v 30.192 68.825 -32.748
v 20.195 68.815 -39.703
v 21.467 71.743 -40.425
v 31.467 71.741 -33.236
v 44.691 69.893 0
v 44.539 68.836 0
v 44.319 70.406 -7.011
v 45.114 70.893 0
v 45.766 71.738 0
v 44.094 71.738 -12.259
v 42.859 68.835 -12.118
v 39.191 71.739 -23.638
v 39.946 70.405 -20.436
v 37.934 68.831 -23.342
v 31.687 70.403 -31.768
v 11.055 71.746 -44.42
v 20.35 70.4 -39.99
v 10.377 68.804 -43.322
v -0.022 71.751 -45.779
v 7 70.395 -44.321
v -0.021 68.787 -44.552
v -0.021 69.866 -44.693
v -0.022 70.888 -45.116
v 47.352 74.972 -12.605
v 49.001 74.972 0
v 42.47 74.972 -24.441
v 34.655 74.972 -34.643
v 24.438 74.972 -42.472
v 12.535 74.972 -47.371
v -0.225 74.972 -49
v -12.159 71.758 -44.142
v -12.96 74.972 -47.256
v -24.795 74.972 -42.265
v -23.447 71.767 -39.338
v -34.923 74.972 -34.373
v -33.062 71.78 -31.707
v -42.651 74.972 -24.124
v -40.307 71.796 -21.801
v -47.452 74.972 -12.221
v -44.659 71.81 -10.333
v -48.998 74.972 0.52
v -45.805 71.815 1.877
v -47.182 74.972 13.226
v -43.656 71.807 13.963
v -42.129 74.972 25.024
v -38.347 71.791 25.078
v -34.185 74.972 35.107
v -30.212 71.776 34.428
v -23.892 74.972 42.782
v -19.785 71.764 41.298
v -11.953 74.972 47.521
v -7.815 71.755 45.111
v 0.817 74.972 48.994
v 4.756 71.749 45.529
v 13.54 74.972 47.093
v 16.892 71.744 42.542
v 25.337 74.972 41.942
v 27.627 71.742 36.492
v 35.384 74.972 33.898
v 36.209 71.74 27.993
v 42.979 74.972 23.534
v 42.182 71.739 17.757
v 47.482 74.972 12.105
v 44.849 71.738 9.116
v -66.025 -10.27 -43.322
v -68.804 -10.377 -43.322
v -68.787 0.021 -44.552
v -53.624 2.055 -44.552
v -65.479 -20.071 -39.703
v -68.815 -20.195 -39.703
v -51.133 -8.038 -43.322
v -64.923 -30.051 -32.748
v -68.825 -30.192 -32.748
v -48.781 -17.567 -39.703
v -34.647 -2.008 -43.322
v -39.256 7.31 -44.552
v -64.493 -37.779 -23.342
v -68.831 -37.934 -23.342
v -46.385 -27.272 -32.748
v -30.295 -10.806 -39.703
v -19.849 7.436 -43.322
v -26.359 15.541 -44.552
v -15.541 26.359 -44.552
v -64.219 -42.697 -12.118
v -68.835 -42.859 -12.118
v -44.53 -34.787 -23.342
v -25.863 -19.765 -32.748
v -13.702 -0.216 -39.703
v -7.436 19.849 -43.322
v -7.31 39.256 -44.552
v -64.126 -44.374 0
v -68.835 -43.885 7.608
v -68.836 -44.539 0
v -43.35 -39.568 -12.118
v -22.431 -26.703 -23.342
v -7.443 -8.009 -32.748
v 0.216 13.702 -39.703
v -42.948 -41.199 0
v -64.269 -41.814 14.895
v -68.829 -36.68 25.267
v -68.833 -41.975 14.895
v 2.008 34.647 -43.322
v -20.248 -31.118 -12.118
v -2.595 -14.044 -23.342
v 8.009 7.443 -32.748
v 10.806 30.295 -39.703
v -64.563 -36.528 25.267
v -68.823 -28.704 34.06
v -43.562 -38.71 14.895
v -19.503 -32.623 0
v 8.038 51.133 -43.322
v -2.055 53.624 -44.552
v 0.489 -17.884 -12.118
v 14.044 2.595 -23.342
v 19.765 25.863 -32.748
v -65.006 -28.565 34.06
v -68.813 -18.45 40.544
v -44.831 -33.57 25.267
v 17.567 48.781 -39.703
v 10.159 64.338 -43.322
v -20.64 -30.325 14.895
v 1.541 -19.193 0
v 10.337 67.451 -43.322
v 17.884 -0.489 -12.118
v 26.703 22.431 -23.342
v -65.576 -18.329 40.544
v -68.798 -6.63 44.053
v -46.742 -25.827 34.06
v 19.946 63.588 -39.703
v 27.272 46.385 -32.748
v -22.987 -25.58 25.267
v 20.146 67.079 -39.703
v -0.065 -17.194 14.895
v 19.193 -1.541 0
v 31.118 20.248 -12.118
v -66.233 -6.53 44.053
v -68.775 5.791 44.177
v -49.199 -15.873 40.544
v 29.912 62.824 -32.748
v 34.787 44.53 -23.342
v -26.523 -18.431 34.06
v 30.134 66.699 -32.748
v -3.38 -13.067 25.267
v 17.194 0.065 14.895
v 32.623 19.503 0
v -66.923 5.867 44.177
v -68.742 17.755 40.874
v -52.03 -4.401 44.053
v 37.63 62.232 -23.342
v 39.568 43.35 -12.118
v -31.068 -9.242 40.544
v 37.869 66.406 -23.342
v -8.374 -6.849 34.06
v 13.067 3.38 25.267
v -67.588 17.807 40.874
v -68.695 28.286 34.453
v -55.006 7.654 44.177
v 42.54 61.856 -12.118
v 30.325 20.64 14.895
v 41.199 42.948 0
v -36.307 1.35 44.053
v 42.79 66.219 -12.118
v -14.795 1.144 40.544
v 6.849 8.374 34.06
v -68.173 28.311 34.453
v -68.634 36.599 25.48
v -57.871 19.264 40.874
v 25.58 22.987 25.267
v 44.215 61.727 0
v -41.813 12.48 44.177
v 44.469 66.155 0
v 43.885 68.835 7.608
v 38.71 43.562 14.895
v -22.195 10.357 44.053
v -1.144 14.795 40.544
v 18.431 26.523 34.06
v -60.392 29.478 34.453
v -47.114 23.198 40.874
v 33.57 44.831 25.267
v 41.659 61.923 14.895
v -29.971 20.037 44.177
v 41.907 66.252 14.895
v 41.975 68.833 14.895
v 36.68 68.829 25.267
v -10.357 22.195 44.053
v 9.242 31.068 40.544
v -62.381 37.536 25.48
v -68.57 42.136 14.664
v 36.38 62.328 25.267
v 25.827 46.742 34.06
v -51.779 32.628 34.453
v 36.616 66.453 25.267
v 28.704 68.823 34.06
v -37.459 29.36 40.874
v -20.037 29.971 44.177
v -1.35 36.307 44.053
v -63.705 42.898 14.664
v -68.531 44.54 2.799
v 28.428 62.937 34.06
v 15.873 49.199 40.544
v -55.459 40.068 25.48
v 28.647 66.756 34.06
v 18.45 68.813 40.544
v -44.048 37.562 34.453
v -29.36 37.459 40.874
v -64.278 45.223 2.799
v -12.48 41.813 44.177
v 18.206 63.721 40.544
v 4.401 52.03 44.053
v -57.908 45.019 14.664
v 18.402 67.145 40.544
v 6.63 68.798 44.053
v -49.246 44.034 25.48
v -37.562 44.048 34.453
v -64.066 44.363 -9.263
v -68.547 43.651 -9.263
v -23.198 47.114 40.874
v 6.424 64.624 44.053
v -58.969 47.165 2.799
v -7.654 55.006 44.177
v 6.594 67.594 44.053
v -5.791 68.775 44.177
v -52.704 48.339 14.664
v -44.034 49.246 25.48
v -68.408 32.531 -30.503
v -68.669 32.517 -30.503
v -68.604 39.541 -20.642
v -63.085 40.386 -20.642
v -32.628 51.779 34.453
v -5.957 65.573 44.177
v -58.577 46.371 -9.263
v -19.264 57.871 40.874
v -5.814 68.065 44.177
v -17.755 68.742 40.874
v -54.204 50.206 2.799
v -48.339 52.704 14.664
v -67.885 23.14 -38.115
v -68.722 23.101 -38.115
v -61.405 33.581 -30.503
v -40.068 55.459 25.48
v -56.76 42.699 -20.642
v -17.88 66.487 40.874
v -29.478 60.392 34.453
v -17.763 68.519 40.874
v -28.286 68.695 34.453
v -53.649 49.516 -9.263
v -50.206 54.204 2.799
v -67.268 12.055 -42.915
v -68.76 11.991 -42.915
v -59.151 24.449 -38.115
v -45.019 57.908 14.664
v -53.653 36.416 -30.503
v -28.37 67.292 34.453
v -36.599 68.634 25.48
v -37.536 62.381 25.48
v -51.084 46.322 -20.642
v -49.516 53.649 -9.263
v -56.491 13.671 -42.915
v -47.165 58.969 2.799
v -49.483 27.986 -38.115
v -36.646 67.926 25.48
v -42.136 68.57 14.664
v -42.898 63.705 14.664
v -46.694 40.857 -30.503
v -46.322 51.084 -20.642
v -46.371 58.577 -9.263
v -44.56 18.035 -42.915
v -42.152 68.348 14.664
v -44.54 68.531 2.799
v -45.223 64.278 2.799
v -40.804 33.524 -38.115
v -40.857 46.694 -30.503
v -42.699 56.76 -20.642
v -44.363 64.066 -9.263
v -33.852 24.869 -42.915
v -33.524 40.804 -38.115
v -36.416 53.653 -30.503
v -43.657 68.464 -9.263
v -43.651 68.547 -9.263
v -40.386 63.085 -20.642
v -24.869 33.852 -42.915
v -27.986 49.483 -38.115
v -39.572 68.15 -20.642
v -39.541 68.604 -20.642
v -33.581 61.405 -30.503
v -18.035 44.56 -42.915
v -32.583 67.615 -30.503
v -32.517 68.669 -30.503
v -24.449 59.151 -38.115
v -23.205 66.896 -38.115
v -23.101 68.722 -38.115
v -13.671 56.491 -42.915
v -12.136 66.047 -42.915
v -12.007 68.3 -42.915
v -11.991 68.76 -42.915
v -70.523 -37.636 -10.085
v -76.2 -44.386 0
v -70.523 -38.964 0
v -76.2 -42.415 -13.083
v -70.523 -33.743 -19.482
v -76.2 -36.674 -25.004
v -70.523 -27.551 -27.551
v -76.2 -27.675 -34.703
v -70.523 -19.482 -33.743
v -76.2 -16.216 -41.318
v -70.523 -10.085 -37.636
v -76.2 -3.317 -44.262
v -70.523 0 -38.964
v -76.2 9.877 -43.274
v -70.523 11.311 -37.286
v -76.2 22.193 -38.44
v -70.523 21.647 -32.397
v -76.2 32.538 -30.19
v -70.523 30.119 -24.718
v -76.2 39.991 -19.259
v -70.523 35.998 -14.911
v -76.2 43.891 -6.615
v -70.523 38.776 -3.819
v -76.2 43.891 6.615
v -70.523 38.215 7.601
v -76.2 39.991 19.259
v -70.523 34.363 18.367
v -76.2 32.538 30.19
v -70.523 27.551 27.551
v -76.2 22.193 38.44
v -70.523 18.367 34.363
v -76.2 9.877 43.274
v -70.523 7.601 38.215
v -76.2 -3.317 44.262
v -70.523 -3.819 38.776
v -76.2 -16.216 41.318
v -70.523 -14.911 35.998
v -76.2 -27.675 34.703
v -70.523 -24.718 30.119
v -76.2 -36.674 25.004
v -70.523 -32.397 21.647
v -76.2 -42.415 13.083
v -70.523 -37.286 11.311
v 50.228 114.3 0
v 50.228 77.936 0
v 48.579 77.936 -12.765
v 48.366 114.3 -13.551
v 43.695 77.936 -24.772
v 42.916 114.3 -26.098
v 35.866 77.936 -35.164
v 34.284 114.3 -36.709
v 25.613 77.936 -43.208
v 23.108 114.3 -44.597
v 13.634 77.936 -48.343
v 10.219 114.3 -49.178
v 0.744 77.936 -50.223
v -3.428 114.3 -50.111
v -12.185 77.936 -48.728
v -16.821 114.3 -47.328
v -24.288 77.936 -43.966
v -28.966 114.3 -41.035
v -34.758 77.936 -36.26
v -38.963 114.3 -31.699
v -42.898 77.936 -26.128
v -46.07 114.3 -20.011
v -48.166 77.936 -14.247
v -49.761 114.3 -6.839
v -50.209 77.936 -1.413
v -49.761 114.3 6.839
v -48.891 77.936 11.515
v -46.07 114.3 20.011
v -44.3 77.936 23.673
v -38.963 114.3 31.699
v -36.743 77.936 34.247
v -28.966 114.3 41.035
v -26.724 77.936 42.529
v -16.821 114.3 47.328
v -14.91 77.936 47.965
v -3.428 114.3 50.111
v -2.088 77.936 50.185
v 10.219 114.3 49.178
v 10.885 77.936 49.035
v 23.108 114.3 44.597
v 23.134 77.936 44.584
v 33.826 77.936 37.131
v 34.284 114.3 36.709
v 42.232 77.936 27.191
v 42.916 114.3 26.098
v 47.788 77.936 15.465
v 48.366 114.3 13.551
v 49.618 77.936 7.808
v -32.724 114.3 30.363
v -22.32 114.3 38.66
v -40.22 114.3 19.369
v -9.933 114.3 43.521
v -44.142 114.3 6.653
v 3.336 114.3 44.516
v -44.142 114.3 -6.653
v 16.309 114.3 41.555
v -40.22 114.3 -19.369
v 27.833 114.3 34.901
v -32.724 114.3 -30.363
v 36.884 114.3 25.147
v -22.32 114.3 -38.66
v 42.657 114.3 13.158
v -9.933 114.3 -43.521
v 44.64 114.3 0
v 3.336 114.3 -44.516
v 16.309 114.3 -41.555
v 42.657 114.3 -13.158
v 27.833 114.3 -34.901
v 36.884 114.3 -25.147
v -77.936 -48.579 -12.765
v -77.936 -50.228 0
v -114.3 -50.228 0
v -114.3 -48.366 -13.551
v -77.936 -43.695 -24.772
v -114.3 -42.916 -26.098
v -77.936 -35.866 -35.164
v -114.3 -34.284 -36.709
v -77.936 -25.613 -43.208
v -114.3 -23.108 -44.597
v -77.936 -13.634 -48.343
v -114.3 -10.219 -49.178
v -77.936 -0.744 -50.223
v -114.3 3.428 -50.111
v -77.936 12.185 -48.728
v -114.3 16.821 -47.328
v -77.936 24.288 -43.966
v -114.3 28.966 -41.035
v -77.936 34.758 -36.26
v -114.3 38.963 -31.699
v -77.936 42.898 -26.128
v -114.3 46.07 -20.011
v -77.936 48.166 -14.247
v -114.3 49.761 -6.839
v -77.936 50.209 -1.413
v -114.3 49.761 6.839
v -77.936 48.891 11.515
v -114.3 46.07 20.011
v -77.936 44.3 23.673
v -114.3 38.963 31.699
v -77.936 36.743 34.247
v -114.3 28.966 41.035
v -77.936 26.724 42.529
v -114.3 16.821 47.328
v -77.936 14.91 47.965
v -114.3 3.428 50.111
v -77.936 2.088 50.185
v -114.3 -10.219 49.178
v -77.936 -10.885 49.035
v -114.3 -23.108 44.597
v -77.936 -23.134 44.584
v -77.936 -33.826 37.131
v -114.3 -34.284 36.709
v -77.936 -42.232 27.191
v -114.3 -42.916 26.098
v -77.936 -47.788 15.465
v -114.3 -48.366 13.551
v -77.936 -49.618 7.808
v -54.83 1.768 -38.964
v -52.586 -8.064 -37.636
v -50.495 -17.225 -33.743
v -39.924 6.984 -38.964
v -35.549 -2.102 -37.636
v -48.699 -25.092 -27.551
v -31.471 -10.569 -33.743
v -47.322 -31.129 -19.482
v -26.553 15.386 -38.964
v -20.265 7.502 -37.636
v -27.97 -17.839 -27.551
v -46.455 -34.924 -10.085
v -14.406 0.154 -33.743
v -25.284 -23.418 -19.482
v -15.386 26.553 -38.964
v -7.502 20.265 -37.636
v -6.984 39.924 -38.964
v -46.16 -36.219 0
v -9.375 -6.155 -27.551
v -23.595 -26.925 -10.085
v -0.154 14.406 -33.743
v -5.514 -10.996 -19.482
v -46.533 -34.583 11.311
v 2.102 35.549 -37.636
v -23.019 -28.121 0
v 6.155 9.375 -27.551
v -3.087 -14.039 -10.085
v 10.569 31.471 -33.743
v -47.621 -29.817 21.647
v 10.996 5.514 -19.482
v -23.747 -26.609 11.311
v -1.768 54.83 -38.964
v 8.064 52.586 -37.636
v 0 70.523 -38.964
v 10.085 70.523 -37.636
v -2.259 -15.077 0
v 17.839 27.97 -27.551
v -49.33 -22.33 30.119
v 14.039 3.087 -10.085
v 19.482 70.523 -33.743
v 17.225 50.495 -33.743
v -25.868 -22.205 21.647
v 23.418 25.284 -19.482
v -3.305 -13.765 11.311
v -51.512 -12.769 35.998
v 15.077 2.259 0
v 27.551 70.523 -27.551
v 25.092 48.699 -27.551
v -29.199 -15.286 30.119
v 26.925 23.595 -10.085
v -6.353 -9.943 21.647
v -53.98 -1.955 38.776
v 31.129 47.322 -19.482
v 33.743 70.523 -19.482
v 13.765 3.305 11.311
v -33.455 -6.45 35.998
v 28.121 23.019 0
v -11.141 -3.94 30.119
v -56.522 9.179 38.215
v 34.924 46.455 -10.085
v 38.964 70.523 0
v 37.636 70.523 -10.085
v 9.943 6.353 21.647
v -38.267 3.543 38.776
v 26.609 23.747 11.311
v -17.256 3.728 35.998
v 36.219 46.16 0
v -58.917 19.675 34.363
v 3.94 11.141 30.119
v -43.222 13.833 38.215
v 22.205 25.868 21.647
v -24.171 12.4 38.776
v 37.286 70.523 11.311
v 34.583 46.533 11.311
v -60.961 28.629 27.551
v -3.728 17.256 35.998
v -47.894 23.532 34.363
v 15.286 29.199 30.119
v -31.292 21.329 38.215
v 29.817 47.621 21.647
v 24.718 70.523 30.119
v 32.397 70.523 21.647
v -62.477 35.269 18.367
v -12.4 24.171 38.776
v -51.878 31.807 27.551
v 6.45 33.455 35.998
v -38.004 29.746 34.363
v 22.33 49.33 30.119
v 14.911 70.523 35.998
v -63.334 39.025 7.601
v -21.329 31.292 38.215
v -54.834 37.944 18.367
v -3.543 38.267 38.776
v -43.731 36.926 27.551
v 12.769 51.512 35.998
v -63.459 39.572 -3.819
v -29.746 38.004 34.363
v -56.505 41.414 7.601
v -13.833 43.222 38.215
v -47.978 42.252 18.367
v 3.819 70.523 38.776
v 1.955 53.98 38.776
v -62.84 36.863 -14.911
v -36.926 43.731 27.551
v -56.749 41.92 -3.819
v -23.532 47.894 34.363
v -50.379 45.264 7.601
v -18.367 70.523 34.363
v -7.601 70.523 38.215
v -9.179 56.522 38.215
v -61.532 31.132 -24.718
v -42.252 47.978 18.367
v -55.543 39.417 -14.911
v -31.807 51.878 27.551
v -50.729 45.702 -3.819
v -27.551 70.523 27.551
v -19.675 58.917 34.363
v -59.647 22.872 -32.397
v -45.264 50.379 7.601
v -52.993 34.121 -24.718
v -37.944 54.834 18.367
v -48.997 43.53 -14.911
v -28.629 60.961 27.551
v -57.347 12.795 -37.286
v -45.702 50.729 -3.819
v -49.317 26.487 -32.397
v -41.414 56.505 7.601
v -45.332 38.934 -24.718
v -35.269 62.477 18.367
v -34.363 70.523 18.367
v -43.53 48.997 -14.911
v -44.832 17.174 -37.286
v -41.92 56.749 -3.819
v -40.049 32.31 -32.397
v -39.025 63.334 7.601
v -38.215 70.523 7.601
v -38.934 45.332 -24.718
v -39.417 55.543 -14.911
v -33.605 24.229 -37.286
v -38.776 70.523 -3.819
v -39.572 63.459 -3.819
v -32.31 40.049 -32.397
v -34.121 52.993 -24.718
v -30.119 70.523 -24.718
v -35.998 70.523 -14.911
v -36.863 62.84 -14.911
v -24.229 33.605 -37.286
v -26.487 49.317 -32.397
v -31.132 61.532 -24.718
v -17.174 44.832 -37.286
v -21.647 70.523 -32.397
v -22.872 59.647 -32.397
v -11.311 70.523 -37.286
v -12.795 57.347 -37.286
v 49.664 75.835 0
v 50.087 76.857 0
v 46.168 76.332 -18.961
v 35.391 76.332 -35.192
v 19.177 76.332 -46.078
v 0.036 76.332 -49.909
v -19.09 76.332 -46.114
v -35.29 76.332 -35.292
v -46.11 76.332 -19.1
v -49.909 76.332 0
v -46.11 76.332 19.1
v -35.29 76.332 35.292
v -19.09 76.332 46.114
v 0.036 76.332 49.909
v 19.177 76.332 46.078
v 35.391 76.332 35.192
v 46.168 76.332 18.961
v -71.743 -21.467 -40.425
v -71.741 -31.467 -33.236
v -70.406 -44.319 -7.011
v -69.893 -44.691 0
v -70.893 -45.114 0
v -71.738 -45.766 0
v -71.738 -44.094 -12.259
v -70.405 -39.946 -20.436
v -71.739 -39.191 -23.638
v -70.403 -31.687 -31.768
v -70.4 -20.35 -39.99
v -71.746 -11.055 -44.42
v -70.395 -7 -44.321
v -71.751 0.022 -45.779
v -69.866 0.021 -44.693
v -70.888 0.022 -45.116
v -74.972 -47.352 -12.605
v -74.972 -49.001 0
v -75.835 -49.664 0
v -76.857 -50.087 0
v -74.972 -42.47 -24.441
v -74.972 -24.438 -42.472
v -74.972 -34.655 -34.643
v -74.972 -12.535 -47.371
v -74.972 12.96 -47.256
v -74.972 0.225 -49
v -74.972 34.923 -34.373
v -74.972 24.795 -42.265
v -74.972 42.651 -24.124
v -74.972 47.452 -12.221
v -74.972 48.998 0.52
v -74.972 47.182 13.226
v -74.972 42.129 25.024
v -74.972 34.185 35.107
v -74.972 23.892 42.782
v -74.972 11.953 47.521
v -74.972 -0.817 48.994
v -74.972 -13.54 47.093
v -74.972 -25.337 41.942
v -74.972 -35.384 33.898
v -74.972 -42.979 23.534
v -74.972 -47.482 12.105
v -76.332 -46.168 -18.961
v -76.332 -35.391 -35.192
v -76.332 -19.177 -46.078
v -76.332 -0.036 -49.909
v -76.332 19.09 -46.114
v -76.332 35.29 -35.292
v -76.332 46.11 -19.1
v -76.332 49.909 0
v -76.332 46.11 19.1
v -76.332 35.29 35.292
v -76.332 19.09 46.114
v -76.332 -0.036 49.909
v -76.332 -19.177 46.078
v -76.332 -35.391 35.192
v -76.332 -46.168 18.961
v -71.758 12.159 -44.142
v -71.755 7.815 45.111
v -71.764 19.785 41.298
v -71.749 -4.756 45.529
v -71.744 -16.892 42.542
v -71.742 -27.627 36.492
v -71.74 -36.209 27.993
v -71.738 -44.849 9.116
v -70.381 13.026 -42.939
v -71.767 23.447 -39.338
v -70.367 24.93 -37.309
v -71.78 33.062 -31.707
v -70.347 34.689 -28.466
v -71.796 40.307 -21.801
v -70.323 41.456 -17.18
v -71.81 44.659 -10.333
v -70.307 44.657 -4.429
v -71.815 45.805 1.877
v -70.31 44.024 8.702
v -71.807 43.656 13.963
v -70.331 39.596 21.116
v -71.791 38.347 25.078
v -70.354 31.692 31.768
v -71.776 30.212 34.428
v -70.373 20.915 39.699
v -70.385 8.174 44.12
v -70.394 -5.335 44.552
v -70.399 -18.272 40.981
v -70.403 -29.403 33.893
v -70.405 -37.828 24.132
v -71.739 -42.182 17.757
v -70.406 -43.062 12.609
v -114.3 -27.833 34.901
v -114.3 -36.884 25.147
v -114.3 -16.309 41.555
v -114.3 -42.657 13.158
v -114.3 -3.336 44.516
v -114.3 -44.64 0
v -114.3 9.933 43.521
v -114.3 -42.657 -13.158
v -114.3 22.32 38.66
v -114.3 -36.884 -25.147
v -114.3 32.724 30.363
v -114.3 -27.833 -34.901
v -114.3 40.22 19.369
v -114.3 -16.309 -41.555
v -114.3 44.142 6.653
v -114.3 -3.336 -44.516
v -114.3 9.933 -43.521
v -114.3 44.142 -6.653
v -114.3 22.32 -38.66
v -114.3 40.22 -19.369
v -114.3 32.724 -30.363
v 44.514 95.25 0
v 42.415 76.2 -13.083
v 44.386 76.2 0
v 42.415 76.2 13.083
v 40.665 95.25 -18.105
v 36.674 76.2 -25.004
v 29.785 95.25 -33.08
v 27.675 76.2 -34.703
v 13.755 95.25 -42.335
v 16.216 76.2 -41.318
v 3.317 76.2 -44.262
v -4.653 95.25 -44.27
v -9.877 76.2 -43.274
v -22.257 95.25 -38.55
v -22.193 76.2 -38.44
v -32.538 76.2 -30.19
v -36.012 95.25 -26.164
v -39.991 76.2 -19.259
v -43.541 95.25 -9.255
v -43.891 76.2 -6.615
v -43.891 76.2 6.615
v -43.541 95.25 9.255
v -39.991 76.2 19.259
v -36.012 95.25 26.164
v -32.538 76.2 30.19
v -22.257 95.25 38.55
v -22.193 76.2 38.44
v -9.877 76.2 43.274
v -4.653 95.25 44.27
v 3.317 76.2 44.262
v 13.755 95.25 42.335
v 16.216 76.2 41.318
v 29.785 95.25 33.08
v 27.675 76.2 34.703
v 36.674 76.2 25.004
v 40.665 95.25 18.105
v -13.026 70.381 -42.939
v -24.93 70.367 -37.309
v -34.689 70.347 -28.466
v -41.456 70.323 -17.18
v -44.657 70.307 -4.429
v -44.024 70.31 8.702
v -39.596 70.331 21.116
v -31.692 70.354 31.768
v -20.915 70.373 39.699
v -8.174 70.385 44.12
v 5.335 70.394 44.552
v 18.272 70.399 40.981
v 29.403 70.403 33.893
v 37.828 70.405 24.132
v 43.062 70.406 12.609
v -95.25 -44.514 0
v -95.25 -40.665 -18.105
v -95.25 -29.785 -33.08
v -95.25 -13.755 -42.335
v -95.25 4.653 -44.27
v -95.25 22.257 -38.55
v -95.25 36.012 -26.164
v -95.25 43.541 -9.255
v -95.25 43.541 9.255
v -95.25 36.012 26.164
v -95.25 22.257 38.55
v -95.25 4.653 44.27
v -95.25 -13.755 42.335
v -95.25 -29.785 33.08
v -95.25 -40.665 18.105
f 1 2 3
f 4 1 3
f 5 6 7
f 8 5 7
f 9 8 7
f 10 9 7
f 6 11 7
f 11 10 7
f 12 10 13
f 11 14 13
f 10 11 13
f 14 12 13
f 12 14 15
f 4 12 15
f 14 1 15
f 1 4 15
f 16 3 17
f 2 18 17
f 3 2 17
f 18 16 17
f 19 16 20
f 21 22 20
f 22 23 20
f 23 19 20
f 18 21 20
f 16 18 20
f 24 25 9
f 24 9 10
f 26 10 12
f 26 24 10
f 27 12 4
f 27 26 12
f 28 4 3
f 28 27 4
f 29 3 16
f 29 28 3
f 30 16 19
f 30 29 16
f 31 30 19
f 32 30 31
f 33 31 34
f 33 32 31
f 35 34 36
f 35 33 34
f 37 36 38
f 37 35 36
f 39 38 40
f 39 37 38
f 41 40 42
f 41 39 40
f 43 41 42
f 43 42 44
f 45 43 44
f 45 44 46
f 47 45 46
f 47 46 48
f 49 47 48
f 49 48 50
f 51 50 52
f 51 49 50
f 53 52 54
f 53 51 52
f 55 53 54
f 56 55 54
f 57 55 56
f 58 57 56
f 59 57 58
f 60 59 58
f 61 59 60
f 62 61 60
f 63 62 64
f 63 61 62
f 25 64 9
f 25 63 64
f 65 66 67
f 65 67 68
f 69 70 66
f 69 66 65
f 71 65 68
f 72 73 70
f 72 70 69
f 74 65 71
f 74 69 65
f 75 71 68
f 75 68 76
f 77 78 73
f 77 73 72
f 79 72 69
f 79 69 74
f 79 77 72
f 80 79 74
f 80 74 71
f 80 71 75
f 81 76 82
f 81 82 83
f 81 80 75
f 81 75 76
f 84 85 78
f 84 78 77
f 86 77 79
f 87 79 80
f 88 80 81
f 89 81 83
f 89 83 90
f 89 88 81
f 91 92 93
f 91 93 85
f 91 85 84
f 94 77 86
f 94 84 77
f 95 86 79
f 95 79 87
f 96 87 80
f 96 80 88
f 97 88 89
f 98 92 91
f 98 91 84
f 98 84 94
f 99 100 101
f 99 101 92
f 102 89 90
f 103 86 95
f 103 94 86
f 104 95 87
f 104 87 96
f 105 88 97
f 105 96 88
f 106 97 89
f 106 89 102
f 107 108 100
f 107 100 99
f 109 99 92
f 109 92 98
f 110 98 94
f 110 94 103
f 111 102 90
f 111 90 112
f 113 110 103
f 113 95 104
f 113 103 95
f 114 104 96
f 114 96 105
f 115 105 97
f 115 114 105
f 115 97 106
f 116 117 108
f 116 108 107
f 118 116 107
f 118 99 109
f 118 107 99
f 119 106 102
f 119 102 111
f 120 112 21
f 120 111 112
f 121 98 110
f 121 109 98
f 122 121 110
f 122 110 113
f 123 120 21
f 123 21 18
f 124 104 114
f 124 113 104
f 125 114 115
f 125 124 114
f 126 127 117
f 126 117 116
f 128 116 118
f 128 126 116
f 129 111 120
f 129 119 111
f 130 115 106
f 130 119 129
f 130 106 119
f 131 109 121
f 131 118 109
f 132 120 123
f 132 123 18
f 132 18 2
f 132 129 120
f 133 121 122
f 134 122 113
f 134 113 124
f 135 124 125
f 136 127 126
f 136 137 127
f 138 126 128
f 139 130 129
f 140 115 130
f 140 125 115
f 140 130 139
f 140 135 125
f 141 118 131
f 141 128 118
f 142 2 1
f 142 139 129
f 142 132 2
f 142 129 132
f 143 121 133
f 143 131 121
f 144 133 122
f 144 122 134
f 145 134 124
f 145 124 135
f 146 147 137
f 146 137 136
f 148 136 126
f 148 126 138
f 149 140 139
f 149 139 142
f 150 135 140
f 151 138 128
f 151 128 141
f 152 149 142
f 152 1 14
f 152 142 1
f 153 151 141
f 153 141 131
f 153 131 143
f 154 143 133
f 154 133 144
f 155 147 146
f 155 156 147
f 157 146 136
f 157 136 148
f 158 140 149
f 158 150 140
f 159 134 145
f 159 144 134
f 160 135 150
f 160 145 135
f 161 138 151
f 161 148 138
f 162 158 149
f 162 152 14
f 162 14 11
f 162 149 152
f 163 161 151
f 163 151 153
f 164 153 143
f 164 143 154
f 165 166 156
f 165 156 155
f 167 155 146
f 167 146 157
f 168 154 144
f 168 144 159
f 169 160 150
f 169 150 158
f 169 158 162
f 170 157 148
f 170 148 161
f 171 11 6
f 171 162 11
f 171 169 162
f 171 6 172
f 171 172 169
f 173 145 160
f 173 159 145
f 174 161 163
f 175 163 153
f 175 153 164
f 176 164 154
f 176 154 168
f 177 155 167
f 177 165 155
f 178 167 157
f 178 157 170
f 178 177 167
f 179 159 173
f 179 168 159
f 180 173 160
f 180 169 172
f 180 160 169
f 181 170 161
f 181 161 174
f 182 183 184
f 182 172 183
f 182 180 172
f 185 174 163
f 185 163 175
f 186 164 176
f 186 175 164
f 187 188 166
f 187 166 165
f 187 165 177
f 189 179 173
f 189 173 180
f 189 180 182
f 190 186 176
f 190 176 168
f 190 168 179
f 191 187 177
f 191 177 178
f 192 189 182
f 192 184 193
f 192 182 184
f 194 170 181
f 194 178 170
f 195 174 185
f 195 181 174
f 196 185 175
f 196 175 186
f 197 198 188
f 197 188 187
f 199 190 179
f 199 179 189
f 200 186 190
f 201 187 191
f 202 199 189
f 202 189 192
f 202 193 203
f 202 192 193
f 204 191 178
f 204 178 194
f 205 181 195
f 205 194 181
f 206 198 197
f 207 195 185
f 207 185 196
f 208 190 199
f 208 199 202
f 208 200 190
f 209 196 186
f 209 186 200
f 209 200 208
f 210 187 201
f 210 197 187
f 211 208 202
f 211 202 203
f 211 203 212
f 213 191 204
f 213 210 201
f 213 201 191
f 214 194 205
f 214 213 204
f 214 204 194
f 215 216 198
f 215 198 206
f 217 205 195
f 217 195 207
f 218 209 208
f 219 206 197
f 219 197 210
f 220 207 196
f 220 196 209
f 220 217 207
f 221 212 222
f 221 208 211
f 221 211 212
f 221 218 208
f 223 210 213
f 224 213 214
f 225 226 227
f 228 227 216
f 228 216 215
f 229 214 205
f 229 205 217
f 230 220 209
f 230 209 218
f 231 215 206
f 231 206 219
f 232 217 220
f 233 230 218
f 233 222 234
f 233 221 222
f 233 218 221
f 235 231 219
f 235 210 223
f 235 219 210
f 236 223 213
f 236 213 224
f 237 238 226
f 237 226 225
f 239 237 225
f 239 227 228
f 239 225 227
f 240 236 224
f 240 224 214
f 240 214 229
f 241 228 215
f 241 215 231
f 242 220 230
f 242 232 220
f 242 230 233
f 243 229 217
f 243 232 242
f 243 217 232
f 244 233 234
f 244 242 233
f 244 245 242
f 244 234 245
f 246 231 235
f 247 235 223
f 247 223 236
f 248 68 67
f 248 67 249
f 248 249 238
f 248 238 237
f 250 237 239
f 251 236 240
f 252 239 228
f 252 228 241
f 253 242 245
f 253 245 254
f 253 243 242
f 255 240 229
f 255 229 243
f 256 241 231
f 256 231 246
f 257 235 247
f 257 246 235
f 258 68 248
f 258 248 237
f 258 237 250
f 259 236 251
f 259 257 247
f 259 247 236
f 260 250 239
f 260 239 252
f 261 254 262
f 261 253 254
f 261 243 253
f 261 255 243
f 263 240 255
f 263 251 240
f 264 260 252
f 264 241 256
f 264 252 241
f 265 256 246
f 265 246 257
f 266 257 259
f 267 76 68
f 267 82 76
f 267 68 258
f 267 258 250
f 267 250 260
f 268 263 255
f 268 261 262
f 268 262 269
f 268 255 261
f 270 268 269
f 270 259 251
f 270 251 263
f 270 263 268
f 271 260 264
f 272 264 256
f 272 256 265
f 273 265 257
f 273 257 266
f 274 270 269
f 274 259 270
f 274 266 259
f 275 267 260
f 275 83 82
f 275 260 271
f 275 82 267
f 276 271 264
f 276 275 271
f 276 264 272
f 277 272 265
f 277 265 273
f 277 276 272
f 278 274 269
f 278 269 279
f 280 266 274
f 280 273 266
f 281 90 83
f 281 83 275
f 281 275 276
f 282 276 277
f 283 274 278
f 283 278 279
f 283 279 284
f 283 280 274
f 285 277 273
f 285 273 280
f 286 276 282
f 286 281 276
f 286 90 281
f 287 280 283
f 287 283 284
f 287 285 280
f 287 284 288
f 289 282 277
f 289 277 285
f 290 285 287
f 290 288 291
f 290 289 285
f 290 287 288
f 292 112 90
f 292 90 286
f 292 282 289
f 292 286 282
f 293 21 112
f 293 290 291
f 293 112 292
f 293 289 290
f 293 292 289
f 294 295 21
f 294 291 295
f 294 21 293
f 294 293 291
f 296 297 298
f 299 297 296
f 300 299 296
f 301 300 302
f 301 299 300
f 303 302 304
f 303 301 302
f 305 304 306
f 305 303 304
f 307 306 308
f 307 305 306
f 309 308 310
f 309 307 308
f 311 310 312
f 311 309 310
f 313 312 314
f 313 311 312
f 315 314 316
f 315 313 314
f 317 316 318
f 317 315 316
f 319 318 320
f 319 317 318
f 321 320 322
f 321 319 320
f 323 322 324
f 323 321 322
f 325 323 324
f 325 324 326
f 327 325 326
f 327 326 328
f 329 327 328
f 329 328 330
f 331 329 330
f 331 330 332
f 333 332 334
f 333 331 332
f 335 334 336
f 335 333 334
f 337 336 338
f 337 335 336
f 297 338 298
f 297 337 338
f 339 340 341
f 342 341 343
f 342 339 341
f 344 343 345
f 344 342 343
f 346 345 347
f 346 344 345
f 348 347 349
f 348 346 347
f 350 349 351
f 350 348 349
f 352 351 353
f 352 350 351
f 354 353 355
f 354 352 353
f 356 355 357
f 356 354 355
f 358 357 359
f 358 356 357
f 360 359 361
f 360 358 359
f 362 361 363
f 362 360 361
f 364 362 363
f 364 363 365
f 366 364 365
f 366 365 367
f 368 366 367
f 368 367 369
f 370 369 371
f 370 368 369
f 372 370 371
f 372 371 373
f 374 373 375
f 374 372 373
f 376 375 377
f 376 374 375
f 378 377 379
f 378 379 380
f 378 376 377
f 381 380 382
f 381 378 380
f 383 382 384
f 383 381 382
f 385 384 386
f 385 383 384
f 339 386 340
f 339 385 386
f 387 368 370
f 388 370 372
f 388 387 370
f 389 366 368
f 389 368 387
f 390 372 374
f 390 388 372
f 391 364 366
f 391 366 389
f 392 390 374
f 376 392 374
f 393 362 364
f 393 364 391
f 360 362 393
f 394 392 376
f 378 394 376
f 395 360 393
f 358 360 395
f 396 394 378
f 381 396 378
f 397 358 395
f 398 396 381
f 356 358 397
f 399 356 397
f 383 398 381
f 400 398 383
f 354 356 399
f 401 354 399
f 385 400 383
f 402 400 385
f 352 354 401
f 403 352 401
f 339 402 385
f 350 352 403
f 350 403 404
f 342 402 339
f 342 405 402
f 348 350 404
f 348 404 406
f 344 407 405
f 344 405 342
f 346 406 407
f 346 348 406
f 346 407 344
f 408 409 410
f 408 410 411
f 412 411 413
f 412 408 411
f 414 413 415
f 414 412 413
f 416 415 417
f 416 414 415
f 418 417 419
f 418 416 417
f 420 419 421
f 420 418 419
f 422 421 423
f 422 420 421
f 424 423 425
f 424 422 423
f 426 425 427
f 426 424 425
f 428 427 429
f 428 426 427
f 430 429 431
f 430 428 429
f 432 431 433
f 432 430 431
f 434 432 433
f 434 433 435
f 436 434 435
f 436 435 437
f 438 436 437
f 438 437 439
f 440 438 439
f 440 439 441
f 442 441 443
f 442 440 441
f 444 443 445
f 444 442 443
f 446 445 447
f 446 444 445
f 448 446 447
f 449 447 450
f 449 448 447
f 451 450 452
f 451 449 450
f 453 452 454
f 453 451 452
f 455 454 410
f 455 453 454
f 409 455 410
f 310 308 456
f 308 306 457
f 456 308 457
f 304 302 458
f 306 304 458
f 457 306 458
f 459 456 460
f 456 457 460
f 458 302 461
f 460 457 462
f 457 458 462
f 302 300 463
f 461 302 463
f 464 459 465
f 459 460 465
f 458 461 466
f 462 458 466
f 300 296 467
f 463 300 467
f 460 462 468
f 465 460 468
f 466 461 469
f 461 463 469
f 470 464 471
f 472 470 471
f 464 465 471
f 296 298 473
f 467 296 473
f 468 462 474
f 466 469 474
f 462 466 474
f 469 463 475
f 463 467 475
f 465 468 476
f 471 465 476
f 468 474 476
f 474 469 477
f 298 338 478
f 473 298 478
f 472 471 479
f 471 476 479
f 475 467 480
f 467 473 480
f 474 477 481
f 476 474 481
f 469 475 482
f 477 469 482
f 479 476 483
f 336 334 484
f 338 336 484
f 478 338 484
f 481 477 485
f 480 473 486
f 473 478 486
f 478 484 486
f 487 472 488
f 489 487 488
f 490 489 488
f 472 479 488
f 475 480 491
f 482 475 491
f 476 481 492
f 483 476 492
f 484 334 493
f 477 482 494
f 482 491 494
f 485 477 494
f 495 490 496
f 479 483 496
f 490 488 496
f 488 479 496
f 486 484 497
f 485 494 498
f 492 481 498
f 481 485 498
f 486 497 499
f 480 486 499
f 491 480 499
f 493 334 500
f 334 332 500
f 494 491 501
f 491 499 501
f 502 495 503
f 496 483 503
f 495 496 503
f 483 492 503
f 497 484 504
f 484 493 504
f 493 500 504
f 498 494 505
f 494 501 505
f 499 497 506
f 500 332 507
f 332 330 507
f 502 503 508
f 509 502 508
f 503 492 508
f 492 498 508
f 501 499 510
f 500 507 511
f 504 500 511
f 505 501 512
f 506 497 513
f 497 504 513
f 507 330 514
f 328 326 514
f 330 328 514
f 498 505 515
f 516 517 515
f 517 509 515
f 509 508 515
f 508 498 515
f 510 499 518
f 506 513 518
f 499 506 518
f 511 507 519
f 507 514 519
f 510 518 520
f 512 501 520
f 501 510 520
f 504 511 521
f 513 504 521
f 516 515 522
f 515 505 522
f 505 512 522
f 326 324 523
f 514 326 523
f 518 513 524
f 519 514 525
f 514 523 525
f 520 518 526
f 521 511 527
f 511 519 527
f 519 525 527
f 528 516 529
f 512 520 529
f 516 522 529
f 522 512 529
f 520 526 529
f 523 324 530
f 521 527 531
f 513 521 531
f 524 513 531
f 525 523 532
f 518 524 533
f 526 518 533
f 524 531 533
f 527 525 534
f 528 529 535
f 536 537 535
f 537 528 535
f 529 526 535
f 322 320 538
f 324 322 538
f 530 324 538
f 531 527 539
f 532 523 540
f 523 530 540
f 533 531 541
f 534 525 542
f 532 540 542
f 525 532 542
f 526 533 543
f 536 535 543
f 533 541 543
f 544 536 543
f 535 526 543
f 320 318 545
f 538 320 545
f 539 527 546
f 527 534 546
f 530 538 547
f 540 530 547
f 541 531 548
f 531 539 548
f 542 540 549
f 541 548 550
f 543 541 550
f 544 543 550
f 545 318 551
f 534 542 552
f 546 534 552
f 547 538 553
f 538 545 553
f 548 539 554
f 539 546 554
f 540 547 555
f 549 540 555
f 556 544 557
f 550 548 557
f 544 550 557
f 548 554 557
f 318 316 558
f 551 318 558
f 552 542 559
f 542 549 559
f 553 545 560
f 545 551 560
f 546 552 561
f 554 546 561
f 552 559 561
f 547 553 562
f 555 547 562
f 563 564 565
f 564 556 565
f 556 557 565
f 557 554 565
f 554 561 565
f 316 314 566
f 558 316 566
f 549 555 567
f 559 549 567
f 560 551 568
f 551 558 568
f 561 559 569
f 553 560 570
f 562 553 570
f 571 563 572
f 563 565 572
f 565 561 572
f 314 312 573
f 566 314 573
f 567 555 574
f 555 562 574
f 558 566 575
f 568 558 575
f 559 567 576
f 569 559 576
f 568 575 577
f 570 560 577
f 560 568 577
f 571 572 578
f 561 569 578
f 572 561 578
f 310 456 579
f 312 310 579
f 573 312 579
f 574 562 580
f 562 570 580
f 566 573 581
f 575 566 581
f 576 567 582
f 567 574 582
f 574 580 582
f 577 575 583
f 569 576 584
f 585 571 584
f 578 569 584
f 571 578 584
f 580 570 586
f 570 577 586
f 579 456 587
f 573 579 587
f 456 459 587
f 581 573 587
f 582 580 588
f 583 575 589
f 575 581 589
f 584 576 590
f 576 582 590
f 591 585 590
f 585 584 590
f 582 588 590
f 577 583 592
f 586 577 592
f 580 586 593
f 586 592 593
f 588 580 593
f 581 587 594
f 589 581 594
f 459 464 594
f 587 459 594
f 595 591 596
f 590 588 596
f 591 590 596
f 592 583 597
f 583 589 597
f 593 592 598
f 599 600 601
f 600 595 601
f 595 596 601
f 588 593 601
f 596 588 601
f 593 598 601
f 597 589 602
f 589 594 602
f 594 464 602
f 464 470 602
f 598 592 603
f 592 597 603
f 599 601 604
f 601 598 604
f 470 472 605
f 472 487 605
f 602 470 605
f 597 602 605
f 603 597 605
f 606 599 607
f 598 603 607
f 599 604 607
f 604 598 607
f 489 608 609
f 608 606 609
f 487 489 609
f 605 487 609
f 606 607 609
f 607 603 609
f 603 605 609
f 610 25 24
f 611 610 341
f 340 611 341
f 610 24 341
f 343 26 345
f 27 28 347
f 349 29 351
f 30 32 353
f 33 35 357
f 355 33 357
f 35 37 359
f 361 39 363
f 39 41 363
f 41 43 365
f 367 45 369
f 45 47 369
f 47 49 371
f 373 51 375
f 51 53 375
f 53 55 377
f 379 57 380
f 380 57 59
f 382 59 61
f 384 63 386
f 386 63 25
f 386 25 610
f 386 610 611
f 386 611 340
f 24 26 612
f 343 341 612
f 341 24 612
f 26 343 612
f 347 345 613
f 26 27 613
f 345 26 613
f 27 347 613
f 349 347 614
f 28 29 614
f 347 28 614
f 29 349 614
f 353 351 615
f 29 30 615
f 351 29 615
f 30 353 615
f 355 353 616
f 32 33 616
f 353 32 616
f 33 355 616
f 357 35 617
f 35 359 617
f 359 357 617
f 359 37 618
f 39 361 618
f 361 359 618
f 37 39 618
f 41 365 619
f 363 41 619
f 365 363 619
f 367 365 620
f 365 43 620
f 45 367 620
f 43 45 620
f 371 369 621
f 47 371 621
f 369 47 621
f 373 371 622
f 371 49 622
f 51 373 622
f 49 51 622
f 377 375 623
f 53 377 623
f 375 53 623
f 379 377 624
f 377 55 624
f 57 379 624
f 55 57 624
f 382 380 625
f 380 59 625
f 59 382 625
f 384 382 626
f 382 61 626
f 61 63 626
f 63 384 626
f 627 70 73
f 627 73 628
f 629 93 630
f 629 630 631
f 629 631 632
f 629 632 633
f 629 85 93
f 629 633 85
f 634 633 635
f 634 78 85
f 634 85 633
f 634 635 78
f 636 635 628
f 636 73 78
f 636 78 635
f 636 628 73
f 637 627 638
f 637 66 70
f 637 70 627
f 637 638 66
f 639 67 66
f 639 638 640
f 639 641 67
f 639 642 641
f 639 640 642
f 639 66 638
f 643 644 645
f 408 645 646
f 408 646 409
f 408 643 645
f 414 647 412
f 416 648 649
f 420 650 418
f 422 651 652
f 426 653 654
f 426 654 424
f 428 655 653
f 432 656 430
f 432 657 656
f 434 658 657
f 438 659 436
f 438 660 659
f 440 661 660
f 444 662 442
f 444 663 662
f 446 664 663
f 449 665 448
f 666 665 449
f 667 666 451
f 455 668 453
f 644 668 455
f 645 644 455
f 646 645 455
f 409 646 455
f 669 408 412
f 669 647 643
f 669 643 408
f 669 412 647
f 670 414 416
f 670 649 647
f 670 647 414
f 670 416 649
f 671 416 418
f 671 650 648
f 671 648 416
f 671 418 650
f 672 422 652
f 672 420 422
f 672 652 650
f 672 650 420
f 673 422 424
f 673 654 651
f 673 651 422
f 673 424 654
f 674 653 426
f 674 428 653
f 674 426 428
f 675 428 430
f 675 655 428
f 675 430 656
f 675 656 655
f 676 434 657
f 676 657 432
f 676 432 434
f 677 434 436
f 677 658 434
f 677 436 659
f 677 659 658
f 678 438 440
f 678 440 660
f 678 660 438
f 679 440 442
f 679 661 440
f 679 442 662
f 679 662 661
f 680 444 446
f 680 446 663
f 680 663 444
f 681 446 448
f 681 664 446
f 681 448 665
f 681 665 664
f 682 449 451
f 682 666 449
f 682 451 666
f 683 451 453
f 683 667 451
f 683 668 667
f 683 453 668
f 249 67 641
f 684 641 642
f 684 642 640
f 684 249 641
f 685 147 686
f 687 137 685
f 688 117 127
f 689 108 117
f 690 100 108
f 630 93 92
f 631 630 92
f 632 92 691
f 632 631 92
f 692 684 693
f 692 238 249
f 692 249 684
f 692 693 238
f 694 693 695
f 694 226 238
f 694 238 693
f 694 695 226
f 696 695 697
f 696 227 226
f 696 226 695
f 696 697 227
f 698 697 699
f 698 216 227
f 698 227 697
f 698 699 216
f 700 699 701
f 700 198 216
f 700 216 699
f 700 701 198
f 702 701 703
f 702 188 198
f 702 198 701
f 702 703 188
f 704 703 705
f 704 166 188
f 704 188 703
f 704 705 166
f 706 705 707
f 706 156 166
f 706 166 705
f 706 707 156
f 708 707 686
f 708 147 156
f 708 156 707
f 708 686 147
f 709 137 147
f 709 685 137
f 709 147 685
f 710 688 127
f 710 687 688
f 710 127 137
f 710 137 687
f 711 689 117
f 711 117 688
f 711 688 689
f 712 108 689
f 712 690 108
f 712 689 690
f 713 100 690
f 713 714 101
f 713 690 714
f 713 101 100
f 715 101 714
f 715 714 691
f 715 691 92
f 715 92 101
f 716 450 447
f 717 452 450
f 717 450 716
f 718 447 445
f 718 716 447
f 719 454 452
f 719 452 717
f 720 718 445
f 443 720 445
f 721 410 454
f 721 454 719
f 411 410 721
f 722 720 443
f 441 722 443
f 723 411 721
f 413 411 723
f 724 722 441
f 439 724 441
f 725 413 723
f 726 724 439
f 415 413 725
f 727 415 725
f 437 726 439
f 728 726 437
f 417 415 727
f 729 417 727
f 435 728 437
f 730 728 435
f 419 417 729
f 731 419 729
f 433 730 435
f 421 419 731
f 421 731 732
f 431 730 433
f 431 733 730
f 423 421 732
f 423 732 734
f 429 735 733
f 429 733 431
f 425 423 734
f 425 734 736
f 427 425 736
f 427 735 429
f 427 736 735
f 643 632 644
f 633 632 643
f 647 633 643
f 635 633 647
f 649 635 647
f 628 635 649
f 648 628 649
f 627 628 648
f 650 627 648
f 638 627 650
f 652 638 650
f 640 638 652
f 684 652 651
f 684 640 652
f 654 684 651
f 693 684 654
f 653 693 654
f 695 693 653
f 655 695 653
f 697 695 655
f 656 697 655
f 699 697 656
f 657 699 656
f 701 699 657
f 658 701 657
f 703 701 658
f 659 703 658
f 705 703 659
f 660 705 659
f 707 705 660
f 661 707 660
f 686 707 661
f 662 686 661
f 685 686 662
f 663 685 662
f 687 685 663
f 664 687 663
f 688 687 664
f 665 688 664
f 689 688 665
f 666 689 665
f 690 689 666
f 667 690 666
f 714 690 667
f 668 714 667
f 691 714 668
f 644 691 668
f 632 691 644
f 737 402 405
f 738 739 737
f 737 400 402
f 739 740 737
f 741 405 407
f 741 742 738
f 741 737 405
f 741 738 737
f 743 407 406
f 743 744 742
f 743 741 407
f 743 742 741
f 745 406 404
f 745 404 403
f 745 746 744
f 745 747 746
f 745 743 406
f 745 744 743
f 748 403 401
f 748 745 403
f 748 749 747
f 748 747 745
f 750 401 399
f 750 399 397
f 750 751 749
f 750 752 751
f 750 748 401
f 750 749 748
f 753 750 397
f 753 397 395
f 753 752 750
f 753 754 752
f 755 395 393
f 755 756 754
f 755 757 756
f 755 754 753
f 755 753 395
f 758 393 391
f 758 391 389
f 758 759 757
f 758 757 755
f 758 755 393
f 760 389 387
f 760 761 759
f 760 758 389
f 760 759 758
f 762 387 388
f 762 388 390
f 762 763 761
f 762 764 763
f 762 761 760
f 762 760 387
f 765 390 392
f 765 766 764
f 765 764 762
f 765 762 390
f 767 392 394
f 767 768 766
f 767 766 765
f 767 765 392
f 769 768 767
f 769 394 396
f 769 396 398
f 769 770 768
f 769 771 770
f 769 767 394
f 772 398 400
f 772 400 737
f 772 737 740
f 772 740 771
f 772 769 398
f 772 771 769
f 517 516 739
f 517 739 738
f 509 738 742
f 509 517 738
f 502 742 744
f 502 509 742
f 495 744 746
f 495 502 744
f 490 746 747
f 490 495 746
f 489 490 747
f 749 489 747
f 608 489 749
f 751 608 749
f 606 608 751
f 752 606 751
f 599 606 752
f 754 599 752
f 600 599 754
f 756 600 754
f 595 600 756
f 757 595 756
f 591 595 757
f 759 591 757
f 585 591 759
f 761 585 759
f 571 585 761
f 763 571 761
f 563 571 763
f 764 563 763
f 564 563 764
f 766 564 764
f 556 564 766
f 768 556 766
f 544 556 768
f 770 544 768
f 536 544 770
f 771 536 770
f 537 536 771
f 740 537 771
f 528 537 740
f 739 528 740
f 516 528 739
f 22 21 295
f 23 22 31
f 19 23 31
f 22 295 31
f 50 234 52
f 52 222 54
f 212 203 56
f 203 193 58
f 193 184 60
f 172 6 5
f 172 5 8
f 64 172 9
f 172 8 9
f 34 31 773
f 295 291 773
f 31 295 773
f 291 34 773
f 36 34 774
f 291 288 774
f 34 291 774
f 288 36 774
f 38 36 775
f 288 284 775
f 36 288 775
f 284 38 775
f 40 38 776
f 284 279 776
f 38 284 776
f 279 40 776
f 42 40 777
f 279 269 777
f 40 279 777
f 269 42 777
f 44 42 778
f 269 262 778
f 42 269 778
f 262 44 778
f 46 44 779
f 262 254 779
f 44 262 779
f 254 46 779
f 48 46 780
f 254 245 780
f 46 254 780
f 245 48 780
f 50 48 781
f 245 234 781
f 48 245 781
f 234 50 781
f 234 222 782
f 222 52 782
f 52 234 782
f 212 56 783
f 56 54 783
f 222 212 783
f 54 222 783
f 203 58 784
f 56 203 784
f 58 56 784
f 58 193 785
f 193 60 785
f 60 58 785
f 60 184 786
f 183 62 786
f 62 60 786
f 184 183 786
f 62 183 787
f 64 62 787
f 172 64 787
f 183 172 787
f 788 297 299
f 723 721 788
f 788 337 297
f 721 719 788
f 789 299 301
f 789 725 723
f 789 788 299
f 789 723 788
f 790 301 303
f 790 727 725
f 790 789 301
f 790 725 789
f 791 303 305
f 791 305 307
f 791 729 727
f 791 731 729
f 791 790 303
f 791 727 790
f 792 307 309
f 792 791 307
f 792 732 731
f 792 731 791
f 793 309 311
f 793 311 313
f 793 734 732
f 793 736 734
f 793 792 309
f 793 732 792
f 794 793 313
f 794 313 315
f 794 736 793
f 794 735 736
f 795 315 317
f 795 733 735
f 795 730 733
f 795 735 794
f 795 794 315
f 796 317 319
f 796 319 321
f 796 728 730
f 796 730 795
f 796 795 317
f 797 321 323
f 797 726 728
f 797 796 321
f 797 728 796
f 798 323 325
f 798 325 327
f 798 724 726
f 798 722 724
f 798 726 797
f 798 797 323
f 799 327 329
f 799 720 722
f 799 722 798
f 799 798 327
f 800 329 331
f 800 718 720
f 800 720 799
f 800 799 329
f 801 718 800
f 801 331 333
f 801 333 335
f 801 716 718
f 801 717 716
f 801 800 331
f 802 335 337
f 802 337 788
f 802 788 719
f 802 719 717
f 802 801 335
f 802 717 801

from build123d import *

# Parameters (mm, degrees)
SKETCH3_R   = 44.5516
SKETCH3_R_2 = 38.9636
FILLET1_R   = 4.191


with BuildPart() as part:
    # Sketch1 → Revolve1 (revolve)
    with BuildSketch(Plane.XY):
        Polygon((-76.2, -50.2285), (-70.5231, -44.5516), (-70.5231, -38.9636), (-76.2, -44.3865), (-114.3, -44.6405), (-114.3, -50.2285), align=None)
    revolve(axis=Axis((-114.3, 0, 0), (1, 0, 0)))



with BuildPart() as body_2:
    # Sketch2 → Revolve2 (revolve)
    with BuildSketch(Plane.XY):
        Polygon((44.6405, 114.3), (44.3865, 76.2), (38.9636, 70.5231), (44.5516, 70.5231), (50.2285, 76.2), (50.2285, 114.3), align=None)
    revolve(axis=Axis((0, 0, 0), (0, 1, 0)))


with BuildPart() as part_1:
    add(part.part)

    add(body_2.part)  # Sweep1 merges body 2
    # Sweep1: sweep along a path in Sketch4
    with BuildLine(Plane.XY) as sweep1_path:
        ThreePointArc((-70.5231, 0), (-20.65573776, 20.65573776), (0, 70.5231))
    # Sketch3 → Sweep1 (sweep)
    with BuildSketch(Plane(origin=(-70.5231, 0, 0), x_dir=(0, 0, -1), z_dir=(1, 0, 0))):
        Circle(SKETCH3_R)
        Circle(SKETCH3_R_2, mode=Mode.SUBTRACT)
    sweep(path=sweep1_path.line)

    # Fillet1
    fillet1_edges = [part_1.edges().sort_by_distance(p)[0] for p in [
        (-70.5231, 31.502738473, 31.502738473),
        (-31.502738473, 70.5231, 31.502738473),
        (-50.2285, 76.2, 0),
        (-76.2, 50.2285, 0),
    ]]
    fillet(fillet1_edges, radius=FILLET1_R)


solid = part_1.part
